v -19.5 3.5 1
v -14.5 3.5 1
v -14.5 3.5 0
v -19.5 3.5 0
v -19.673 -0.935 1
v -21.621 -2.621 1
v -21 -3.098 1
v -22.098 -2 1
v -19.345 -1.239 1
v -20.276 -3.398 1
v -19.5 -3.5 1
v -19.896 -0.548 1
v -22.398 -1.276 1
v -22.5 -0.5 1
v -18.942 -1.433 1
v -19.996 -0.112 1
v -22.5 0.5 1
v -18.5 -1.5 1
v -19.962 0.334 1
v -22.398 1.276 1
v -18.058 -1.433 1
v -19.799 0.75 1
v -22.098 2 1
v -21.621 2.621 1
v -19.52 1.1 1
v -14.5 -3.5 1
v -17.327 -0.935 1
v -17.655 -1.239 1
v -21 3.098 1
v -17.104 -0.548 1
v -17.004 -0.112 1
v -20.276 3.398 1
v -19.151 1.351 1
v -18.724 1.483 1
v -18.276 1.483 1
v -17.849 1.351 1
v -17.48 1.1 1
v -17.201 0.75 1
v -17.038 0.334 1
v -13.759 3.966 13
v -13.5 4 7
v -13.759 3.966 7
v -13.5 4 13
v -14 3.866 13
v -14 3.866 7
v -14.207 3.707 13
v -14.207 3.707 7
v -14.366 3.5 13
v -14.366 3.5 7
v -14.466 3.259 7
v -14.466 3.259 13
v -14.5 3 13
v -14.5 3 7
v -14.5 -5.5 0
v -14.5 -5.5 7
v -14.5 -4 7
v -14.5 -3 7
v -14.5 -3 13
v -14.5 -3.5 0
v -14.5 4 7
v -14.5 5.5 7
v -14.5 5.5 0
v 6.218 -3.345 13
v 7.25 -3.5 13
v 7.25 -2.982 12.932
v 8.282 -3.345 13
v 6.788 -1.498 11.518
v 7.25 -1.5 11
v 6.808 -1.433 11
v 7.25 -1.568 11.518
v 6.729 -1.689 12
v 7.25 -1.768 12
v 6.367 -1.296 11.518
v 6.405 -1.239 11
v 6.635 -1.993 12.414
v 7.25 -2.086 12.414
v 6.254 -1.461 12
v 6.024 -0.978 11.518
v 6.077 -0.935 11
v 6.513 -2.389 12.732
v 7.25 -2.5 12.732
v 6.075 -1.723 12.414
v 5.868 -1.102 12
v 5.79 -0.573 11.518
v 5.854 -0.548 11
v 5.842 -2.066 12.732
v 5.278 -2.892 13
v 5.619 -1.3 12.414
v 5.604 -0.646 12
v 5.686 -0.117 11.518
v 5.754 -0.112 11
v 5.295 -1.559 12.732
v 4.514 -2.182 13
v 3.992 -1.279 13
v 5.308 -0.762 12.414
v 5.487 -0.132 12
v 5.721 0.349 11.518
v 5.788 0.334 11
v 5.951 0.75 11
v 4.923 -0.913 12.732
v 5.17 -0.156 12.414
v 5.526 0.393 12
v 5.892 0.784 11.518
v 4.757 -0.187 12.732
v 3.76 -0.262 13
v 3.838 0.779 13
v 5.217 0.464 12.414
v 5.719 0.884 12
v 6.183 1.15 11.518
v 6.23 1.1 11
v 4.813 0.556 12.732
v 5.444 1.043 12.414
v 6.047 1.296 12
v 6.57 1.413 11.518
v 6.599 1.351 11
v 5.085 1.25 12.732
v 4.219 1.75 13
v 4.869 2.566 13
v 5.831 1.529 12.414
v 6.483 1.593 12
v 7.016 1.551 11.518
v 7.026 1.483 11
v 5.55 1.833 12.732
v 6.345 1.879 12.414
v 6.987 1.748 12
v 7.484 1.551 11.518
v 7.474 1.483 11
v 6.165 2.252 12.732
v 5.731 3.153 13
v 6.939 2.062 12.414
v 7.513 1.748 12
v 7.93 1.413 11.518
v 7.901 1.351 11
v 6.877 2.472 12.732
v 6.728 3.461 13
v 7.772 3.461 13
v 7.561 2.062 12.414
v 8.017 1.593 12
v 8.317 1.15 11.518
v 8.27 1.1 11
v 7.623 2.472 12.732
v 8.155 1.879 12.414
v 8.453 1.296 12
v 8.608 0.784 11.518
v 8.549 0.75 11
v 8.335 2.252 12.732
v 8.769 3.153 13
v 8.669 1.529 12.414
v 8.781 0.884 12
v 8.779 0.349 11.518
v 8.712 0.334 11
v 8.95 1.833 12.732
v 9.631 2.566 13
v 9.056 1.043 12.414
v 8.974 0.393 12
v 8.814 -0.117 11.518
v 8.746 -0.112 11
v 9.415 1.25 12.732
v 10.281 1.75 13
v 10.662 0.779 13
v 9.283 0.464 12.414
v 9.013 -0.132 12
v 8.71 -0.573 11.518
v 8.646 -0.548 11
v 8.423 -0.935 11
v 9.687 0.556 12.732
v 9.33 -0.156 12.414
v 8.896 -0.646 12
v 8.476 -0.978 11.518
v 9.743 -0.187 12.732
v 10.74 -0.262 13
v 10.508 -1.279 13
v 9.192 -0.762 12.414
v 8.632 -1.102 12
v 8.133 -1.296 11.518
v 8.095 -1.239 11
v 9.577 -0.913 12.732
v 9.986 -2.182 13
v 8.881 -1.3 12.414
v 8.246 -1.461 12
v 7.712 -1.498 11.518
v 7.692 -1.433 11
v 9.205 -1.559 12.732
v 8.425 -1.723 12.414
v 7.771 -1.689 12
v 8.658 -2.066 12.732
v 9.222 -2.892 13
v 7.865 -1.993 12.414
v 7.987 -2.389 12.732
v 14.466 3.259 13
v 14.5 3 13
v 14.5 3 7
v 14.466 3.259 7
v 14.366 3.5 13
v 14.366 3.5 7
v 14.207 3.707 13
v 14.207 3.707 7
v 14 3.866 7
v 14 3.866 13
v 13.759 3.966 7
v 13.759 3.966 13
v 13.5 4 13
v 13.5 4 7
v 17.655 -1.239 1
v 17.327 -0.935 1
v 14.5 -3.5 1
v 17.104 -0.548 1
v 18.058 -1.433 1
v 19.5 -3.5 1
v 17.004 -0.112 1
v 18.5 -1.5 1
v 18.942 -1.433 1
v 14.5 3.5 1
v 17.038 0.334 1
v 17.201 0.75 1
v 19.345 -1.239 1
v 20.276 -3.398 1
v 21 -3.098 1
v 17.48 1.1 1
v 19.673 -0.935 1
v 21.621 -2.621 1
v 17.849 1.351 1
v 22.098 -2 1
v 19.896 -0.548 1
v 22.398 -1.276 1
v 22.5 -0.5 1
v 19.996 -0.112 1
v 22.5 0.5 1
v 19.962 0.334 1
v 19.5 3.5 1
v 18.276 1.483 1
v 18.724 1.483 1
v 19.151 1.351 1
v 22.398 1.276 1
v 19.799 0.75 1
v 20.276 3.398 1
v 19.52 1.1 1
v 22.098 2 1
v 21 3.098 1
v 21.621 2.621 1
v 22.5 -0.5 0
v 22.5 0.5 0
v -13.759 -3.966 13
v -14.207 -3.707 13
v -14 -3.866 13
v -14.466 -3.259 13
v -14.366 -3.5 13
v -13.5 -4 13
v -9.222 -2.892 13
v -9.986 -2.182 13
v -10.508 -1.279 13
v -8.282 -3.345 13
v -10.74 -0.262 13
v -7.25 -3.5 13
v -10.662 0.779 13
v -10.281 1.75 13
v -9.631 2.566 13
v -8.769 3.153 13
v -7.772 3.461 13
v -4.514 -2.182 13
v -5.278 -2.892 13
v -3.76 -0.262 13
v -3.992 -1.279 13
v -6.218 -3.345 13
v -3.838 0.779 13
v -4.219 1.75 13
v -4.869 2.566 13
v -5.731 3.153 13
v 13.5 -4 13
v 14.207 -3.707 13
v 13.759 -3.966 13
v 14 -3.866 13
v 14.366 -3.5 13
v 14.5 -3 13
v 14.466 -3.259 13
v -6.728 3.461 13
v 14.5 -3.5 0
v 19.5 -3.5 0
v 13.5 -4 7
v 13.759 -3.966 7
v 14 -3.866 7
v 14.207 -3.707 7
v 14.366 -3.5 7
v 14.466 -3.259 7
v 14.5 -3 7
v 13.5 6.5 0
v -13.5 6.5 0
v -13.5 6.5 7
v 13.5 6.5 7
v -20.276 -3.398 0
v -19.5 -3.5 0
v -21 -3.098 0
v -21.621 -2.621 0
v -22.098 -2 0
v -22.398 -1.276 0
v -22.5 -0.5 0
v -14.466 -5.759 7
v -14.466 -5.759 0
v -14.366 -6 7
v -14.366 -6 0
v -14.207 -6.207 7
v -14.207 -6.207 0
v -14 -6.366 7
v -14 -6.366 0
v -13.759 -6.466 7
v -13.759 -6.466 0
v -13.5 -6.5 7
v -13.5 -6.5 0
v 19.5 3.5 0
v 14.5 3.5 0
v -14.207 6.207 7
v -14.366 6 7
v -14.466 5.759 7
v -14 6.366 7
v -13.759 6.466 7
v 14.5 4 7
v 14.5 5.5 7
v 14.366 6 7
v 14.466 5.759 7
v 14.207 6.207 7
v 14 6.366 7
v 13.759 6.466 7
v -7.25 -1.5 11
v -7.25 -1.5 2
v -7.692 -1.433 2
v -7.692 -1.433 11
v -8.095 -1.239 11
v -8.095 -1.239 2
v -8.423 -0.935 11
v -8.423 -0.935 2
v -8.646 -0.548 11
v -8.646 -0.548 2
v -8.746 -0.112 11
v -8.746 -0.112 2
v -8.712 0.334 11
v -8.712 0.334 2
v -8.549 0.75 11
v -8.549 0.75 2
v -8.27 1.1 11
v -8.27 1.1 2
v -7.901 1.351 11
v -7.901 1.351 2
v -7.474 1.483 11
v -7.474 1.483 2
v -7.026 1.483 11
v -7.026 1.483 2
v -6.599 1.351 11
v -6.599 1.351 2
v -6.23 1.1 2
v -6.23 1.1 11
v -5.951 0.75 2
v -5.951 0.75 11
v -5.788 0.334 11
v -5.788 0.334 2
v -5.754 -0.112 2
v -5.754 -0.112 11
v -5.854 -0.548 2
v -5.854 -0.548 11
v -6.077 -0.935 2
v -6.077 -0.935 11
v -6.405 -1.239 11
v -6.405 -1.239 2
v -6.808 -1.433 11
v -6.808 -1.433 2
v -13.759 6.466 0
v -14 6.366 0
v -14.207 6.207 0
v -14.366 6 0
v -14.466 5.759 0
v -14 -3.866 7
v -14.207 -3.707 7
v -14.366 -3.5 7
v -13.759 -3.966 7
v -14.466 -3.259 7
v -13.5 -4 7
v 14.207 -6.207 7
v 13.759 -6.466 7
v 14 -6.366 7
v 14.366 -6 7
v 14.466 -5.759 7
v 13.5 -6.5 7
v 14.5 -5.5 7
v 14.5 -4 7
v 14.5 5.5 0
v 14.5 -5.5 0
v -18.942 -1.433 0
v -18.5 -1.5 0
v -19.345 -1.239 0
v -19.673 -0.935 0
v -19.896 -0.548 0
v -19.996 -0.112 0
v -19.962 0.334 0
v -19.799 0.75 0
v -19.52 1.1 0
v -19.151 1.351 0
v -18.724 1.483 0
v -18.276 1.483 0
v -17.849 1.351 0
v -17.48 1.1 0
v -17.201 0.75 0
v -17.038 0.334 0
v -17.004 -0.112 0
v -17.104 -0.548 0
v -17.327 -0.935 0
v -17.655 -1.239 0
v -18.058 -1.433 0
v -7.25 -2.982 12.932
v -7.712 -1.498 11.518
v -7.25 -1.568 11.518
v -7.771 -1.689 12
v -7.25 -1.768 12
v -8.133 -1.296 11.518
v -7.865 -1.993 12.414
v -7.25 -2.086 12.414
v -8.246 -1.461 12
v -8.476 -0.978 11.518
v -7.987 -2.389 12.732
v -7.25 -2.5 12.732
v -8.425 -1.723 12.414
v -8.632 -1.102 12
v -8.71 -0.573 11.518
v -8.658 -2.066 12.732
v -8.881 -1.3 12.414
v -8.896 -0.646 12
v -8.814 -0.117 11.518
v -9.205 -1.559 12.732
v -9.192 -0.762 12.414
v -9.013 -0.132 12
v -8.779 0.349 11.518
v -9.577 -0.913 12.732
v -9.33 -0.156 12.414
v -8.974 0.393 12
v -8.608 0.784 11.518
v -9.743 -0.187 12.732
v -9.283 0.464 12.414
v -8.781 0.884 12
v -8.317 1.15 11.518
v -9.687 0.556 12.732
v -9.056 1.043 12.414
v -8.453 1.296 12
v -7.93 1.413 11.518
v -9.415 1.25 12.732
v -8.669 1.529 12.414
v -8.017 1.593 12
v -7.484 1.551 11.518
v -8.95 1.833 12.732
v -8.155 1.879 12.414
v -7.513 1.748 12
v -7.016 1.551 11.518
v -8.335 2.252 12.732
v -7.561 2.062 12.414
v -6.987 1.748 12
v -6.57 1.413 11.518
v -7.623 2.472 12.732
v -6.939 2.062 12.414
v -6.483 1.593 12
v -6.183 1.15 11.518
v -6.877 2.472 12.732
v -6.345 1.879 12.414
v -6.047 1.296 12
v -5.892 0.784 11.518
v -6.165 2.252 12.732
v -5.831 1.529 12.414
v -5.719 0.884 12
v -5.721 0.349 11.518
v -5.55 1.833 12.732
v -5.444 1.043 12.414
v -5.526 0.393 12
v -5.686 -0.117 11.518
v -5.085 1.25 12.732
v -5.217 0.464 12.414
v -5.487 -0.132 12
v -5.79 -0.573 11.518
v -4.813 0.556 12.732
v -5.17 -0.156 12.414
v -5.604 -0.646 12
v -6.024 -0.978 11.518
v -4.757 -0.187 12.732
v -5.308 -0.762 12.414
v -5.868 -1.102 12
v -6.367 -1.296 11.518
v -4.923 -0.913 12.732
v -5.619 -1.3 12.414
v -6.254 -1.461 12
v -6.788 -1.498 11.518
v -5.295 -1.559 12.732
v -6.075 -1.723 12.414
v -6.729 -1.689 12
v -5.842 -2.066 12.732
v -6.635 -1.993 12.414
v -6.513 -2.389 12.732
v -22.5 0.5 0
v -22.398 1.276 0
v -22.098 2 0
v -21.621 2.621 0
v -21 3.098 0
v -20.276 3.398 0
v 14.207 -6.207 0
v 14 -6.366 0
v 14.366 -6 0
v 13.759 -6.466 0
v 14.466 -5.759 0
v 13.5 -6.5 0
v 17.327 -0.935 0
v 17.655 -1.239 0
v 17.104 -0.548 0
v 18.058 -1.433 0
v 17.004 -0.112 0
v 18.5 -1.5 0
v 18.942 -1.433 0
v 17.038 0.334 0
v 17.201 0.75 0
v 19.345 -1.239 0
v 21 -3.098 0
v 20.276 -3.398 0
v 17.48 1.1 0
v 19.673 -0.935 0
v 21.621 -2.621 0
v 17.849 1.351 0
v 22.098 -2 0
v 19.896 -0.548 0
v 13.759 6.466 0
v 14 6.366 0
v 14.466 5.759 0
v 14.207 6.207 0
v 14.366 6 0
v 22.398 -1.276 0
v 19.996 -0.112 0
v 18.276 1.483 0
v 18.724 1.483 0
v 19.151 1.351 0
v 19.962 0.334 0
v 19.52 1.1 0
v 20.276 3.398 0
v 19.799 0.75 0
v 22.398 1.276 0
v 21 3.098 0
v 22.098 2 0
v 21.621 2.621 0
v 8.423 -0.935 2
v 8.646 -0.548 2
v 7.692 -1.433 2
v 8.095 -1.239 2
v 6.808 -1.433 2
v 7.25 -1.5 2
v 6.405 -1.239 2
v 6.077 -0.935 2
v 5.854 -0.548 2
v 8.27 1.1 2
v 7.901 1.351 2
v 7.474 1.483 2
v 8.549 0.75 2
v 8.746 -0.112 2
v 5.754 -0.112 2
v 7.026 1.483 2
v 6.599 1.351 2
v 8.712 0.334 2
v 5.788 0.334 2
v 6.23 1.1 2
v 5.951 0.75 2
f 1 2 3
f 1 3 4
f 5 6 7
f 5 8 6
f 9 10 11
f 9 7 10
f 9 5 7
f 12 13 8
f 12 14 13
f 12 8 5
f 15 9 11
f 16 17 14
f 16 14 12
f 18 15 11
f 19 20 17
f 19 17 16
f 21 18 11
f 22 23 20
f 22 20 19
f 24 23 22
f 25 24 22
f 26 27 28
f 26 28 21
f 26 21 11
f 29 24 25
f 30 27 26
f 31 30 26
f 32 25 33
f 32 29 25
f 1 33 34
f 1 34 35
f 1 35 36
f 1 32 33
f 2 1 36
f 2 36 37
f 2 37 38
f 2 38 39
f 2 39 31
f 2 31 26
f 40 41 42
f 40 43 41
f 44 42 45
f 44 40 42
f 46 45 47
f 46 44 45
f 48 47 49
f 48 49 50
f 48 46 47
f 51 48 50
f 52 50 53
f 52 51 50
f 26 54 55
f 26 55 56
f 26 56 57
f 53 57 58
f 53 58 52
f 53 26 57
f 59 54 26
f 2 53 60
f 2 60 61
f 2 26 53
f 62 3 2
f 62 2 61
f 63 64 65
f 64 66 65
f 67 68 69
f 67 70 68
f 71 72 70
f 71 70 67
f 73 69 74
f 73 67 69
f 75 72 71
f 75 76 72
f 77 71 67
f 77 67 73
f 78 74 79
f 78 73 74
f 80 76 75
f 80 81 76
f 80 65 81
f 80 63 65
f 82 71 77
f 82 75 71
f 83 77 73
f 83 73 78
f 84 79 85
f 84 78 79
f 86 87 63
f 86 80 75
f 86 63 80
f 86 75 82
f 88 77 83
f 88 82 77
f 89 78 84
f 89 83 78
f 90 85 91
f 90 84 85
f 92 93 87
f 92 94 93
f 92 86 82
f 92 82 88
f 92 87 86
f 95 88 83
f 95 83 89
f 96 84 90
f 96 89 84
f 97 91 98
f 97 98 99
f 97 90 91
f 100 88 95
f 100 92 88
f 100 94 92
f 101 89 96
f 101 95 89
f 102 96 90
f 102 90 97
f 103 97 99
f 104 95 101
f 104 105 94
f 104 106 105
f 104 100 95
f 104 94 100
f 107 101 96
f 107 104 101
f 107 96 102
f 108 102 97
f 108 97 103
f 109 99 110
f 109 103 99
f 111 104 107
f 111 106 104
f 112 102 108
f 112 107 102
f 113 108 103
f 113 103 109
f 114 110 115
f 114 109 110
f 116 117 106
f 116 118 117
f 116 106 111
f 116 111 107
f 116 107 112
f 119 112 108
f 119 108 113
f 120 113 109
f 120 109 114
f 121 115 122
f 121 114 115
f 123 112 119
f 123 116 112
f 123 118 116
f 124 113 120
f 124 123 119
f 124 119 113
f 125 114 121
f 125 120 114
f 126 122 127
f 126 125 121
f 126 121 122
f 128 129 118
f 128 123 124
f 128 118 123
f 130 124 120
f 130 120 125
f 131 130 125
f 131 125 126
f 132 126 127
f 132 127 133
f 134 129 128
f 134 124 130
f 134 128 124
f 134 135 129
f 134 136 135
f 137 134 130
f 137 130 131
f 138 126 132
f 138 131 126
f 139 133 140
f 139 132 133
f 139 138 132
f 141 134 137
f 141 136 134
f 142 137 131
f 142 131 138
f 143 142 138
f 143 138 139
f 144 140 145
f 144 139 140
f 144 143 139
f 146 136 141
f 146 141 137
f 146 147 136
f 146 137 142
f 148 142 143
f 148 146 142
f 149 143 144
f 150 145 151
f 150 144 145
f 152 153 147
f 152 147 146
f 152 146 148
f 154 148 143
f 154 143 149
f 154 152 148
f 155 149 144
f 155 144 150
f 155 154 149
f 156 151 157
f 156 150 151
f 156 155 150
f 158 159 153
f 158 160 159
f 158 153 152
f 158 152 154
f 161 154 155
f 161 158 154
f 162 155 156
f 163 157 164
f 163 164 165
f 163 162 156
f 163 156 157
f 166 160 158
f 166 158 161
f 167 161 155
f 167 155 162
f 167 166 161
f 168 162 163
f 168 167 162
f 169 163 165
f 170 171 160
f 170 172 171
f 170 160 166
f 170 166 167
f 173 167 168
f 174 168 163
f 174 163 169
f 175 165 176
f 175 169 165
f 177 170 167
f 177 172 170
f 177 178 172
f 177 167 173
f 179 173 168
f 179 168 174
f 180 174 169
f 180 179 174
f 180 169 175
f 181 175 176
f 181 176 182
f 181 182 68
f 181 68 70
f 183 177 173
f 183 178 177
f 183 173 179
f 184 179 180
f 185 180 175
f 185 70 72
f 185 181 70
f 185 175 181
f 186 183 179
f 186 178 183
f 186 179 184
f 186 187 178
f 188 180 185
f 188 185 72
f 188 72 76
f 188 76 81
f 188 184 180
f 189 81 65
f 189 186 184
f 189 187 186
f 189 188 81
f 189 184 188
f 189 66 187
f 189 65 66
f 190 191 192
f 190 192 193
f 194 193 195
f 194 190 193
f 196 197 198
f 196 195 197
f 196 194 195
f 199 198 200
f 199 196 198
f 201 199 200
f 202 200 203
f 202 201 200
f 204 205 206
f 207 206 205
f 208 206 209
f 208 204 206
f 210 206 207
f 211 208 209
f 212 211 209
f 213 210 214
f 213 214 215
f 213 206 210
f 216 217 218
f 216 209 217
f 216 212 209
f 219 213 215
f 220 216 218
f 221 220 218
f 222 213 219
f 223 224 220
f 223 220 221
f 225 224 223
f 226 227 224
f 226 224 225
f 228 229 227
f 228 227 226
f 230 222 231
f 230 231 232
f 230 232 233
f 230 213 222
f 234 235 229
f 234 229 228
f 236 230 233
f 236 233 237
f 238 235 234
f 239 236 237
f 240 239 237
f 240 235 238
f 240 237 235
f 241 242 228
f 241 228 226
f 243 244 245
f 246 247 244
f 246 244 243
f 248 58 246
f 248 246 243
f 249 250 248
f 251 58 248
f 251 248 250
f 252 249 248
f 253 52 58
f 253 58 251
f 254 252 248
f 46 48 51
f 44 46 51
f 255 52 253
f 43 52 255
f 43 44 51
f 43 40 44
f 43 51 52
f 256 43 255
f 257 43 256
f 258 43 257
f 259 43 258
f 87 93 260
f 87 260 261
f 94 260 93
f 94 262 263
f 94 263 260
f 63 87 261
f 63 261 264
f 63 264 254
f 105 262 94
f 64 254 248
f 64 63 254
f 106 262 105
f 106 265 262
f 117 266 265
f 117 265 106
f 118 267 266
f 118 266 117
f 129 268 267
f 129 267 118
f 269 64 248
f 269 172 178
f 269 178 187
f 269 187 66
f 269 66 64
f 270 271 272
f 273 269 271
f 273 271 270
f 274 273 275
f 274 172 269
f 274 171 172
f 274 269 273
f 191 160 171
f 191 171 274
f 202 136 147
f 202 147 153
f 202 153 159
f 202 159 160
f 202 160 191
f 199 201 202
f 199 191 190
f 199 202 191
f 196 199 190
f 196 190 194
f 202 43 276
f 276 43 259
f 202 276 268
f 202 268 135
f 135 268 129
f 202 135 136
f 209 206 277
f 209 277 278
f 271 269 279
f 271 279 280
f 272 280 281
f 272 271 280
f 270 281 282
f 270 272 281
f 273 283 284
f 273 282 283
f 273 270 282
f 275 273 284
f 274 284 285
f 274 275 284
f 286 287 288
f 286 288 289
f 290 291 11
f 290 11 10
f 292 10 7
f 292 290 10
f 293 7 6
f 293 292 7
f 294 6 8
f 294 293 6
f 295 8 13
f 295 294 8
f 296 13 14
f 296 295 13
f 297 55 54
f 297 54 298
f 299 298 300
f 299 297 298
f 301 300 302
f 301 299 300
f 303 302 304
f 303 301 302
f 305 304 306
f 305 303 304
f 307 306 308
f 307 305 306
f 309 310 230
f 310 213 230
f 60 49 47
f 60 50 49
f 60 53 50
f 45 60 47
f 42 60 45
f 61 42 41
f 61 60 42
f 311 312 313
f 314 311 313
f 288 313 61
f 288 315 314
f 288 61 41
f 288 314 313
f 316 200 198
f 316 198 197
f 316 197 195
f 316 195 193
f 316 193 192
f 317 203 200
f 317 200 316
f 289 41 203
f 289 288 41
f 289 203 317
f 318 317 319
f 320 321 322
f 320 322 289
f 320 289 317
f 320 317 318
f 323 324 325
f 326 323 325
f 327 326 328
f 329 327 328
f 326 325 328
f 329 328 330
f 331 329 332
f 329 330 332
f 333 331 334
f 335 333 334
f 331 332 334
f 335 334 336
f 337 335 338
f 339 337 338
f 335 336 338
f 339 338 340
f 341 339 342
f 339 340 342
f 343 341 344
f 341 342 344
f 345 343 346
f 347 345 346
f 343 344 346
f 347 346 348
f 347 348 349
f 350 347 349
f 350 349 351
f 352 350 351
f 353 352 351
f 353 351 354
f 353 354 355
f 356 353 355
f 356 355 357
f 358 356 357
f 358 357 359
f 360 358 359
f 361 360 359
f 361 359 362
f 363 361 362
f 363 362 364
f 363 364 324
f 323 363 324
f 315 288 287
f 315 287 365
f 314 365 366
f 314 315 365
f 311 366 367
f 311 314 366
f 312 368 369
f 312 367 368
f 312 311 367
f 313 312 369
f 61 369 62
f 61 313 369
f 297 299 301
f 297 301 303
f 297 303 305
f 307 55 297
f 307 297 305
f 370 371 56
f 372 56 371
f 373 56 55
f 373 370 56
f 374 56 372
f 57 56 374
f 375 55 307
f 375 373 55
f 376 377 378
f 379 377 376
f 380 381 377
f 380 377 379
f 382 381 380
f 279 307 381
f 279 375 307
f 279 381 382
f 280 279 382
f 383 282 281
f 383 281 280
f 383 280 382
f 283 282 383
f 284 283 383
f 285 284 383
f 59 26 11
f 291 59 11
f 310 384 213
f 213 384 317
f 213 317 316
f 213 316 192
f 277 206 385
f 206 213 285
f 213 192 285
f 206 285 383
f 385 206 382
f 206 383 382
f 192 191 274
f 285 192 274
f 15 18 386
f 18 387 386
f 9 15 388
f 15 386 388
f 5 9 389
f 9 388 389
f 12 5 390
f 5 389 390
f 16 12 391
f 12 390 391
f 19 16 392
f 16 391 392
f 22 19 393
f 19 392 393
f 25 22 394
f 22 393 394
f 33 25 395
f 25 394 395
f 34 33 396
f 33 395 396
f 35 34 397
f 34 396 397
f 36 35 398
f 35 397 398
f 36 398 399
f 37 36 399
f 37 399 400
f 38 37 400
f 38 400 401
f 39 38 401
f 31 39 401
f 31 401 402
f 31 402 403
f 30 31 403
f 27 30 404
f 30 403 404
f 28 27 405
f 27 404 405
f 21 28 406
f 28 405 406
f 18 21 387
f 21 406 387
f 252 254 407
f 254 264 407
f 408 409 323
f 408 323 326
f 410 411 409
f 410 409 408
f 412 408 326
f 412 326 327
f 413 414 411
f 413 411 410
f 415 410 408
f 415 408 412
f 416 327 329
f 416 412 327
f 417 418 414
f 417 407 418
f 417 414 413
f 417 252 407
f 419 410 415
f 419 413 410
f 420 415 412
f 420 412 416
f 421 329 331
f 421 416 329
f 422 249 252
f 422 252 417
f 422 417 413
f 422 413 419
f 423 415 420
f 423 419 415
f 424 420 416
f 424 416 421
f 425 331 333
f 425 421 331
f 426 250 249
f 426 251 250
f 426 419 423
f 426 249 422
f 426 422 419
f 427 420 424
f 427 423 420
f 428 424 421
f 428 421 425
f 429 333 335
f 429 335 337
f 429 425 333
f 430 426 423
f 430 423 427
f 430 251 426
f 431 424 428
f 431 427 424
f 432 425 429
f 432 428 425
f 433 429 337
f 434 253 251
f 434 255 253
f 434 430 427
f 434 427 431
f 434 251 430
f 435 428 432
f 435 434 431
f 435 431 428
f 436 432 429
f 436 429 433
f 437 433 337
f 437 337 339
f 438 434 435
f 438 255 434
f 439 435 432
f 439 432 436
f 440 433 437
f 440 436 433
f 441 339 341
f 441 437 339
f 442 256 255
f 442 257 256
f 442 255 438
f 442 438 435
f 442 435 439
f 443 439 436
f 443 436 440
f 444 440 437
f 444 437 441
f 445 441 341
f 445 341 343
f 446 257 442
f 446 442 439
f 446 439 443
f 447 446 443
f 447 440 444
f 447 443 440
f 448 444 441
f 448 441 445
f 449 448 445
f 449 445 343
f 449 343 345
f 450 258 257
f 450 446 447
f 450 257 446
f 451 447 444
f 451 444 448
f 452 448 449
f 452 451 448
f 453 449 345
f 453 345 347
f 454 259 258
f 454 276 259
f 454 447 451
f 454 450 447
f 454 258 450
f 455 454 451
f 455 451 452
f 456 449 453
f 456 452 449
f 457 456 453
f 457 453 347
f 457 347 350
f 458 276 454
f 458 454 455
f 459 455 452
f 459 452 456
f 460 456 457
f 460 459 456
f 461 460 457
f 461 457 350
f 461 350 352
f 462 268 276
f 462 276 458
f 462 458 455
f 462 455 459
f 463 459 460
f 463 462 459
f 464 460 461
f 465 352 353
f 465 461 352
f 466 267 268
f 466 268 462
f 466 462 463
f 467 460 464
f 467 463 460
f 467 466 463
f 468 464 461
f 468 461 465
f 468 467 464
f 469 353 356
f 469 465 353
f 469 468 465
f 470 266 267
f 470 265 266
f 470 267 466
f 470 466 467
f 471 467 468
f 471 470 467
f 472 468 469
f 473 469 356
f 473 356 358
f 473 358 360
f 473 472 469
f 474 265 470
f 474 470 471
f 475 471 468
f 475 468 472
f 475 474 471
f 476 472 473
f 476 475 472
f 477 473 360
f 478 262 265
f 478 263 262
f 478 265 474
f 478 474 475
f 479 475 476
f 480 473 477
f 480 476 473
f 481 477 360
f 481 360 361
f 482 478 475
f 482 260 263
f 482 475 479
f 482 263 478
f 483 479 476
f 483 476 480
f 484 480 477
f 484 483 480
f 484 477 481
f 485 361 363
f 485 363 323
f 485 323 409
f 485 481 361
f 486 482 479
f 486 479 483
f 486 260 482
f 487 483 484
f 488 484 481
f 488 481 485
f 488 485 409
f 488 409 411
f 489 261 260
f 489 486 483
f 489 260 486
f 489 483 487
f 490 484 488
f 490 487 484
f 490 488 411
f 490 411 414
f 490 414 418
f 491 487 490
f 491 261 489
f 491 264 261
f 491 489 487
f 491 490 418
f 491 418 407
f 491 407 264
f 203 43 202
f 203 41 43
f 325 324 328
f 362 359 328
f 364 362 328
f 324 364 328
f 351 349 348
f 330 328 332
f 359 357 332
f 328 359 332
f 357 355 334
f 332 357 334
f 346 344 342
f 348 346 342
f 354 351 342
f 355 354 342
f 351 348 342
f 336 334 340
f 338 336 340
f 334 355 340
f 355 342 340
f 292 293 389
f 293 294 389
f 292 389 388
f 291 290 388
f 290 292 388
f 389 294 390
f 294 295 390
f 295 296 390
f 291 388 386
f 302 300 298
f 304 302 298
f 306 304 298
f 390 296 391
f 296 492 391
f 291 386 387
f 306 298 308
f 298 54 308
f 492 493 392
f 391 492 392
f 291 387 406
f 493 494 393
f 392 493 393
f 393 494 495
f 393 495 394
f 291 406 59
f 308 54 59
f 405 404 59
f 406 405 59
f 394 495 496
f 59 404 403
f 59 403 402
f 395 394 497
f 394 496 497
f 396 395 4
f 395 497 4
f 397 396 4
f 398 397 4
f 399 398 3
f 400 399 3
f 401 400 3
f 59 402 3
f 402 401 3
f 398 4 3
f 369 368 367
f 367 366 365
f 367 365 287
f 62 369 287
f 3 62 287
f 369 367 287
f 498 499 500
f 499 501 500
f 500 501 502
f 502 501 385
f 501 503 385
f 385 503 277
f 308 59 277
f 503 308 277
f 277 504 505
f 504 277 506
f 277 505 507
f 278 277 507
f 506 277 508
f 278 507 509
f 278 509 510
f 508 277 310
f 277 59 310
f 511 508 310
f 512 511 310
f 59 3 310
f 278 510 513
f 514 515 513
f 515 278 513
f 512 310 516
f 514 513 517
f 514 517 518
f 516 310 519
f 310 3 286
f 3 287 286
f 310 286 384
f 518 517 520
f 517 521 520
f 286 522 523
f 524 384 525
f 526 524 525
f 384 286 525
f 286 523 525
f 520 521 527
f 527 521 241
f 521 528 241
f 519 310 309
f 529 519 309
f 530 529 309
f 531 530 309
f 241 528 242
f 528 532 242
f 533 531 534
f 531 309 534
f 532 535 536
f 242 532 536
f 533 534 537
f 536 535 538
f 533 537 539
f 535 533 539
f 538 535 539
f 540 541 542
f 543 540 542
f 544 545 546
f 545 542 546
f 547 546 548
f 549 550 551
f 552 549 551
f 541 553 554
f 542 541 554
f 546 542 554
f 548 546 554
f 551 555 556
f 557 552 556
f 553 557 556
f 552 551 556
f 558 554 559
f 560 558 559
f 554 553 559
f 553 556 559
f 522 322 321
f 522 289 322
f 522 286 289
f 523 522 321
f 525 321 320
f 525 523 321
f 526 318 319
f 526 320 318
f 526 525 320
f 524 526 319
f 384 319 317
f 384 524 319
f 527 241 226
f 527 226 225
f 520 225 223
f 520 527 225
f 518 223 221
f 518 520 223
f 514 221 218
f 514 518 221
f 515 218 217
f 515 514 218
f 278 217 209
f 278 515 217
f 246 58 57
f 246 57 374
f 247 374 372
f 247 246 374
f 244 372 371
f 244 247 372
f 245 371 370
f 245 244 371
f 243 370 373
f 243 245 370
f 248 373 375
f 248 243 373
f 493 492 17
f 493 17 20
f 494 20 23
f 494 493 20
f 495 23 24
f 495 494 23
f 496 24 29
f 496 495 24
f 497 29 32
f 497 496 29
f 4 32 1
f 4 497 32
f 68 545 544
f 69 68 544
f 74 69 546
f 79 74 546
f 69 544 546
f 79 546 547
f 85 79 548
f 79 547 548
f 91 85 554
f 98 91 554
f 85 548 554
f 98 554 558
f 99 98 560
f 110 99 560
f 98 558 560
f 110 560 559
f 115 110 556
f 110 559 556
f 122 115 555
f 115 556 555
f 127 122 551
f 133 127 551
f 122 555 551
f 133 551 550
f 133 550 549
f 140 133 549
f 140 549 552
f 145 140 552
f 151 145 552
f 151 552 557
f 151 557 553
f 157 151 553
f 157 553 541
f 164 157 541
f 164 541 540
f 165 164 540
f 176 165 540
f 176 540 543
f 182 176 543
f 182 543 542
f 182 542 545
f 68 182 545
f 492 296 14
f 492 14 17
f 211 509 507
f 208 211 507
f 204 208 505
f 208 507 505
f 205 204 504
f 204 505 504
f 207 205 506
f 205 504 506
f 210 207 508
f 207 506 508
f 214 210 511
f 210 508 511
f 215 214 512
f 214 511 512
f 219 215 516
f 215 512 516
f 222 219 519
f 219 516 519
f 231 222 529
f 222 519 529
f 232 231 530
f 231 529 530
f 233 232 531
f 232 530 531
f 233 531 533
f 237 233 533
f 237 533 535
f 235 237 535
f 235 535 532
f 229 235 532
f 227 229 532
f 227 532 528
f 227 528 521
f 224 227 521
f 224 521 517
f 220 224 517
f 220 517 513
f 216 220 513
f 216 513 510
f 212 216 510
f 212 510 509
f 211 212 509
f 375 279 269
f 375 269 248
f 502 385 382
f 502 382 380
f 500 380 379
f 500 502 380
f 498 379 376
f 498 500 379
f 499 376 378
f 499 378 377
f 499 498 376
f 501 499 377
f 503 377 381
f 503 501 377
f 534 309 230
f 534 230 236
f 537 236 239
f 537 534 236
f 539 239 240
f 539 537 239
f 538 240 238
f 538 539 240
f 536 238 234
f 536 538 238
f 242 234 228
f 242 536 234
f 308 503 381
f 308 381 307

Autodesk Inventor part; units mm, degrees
ref_plane "YZ Plane" through (0, 0, 0) normal (1, 0, 0) x (0, 1, 0)
ref_plane "XZ Plane" through (0, 0, 0) normal (0, 1, 0) x (-1, 0, 0)
ref_plane "XY Plane" through (0, 0, 0) normal (0, 0, 1) x (1, 0, 0)
sketch "スケッチ1" plane through (0, 0, 0) normal (0, 0, 1) x (1, 0, 0)
  line L0 (-22.5, 6.5) -> (22.5, 6.5)
  line L1 (22.5, 6.5) -> (22.5, -6.5)
  line L2 (22.5, -6.5) -> (-22.5, -6.5)
  line L3 (-22.5, -6.5) -> (-22.5, 6.5)
  line L4 (-22.5, 6.5) -> (22.5, -6.5) construction
  line L5 (22.5, 6.5) -> (-22.5, -6.5) construction
  point P0 (0, 0)
  dimension "d0" = 45
  dimension "d1" = 13
extrude "押し出し1" add sketch "スケッチ1" along normal blind 1
sketch "スケッチ2" plane through (0, 0, 1) normal (0, 0, 1) x (1, 0, 0)
  line L0 (-14.5, 6.5) -> (14.5, 6.5)
  line L1 (14.5, 6.5) -> (14.5, -6.5)
  line L2 (14.5, -6.5) -> (-14.5, -6.5)
  line L3 (-14.5, -6.5) -> (-14.5, 6.5)
  line L4 (-14.5, 6.5) -> (14.5, -6.5) construction
  line L5 (14.5, 6.5) -> (-14.5, -6.5) construction
  point P0 (0, 0)
  dimension "d4" = 29
  dimension "d5" = 13
extrude "押し出し2" add sketch "スケッチ2" along normal blind 6
sketch "スケッチ4" plane through (0, 0, 7) normal (0, 0, 1) x (1, 0, 0)
  line L0 (-14.5, 4) -> (14.5, 4)
  line L1 (14.5, 4) -> (14.5, -4)
  line L2 (14.5, -4) -> (-14.5, -4)
  line L3 (-14.5, -4) -> (-14.5, 4)
  line L4 (-14.5, 4) -> (14.5, -4) construction
  line L5 (14.5, 4) -> (-14.5, -4) construction
  point P0 (0, 0)
  dimension "d8" = 29
  dimension "d9" = 8
extrude "押し出し3" add sketch "スケッチ4" along normal blind 6
sketch "スケッチ5" plane through (0, 0, 1) normal (0, 0, 1) x (1, 0, 0)
  point P0 (0, 0)
sketch "スケッチ6" plane through (0, 0, 1) normal (0, 0, 1) x (1, 0, 0)
  line L0 (22.5, 6.5) -> (14.5, 6.5)
  line L1 (14.5, 6.5) -> (14.5, 3.5)
  line L2 (14.5, 3.5) -> (22.5, 3.5)
  line L3 (22.5, 3.5) -> (22.5, 6.5)
  line L4 (22.5, -6.5) -> (14.5, -6.5)
  line L5 (14.5, -6.5) -> (14.5, -3.5)
  line L6 (14.5, -3.5) -> (22.5, -3.5)
  line L7 (22.5, -3.5) -> (22.5, -6.5)
  line L8 (-22.5, 6.5) -> (-14.5, 6.5)
  line L9 (-14.5, 6.5) -> (-14.5, 3.5)
  line L10 (-14.5, 3.5) -> (-22.5, 3.5)
  line L11 (-22.5, 3.5) -> (-22.5, 6.5)
  line L12 (-22.5, -6.5) -> (-14.5, -6.5)
  line L13 (-14.5, -6.5) -> (-14.5, -3.5)
  line L14 (-14.5, -3.5) -> (-22.5, -3.5)
  line L15 (-22.5, -3.5) -> (-22.5, -6.5)
  point P0 (0, 0)
  dimension "d12" = 8
  dimension "d13" = 3
  dimension "d14" = 8
  dimension "d15" = 3
  dimension "d16" = 8
  dimension "d17" = 3
  dimension "d18" = 8
  dimension "d19" = 3
extrude "押し出し4" cut sketch "スケッチ6" against normal blind 6
fillet "フィレット1" radius 3 4 edges at (22.5, 3.5, 0.5) (22.5, -3.5, 0.5) (-22.5, 3.5, 0.5) (-22.5, -3.5, 0.5)
sketch "スケッチ7" plane through (0, 0, 13) normal (0, 0, 1) x (1, 0, 0)
  point P0 (0, 0)
  point P1 (7.25, 0)
  point P2 (-7.25, 0)
  point P3 (-18.5, 0)
  point P4 (18.5, 0)
hole "穴1" at (7.25, 0, 13) at (-7.25, 0, 13) at (-18.5, 0, 13) at (18.5, 0, 13) direction (0, 0, -1) diameter 3 end through all
fillet "フィレット2" radius 2 2 edges at (-7.25, 1.5, 13) (7.25, 1.5, 13)
sketch "スケッチ8" plane through (0, 0, 0) normal (0, 0, -1) x (-1, 0, 0)
  line L0 (12.5, -3.5) -> (-12.5, -3.5)
  line L1 (-12.5, -3.5) -> (-12.5, 3.5)
  line L2 (-12.5, 3.5) -> (12.5, 3.5)
  line L3 (12.5, 3.5) -> (12.5, -3.5)
  line L4 (12.5, -3.5) -> (-12.5, 3.5) construction
  line L5 (-12.5, -3.5) -> (12.5, 3.5) construction
  point P0 (0, 0)
  dimension "d31" = 7
  dimension "d32" = 25
extrude "押し出し5" cut sketch "スケッチ8" against normal blind 2
sketch "スケッチ9" plane through (0, 0, 2) normal (0, 0, -1) x (-1, 0, 0)
  line L0 (12.5, -3.5) -> (-12.5, -3.5)
  line L1 (-12.5, -3.5) -> (-12.5, 3.5)
  line L2 (-12.5, 3.5) -> (12.5, 3.5)
  line L3 (12.5, 3.5) -> (12.5, -3.5)
  line L4 (12.5, -3.5) -> (-12.5, 3.5) construction
  line L5 (-12.5, -3.5) -> (12.5, 3.5) construction
  point P0 (0, 0)
  dimension "d35" = 25
  dimension "d36" = 7
extrude "押し出し6" add sketch "スケッチ9" along normal blind 2
fillet "フィレット3" radius 1 8 edges at (14.5, 4, 10) (14.5, 6.5, 3.5) (14.5, -4, 10) (14.5, -6.5, 3.5) (-14.5, 6.5, 3.5) (-14.5, 4, 10) (-14.5, -4, 10) (-14.5, -6.5, 3.5)
properties part number "PSDセンサ" material "アセタール樹脂、黒"
